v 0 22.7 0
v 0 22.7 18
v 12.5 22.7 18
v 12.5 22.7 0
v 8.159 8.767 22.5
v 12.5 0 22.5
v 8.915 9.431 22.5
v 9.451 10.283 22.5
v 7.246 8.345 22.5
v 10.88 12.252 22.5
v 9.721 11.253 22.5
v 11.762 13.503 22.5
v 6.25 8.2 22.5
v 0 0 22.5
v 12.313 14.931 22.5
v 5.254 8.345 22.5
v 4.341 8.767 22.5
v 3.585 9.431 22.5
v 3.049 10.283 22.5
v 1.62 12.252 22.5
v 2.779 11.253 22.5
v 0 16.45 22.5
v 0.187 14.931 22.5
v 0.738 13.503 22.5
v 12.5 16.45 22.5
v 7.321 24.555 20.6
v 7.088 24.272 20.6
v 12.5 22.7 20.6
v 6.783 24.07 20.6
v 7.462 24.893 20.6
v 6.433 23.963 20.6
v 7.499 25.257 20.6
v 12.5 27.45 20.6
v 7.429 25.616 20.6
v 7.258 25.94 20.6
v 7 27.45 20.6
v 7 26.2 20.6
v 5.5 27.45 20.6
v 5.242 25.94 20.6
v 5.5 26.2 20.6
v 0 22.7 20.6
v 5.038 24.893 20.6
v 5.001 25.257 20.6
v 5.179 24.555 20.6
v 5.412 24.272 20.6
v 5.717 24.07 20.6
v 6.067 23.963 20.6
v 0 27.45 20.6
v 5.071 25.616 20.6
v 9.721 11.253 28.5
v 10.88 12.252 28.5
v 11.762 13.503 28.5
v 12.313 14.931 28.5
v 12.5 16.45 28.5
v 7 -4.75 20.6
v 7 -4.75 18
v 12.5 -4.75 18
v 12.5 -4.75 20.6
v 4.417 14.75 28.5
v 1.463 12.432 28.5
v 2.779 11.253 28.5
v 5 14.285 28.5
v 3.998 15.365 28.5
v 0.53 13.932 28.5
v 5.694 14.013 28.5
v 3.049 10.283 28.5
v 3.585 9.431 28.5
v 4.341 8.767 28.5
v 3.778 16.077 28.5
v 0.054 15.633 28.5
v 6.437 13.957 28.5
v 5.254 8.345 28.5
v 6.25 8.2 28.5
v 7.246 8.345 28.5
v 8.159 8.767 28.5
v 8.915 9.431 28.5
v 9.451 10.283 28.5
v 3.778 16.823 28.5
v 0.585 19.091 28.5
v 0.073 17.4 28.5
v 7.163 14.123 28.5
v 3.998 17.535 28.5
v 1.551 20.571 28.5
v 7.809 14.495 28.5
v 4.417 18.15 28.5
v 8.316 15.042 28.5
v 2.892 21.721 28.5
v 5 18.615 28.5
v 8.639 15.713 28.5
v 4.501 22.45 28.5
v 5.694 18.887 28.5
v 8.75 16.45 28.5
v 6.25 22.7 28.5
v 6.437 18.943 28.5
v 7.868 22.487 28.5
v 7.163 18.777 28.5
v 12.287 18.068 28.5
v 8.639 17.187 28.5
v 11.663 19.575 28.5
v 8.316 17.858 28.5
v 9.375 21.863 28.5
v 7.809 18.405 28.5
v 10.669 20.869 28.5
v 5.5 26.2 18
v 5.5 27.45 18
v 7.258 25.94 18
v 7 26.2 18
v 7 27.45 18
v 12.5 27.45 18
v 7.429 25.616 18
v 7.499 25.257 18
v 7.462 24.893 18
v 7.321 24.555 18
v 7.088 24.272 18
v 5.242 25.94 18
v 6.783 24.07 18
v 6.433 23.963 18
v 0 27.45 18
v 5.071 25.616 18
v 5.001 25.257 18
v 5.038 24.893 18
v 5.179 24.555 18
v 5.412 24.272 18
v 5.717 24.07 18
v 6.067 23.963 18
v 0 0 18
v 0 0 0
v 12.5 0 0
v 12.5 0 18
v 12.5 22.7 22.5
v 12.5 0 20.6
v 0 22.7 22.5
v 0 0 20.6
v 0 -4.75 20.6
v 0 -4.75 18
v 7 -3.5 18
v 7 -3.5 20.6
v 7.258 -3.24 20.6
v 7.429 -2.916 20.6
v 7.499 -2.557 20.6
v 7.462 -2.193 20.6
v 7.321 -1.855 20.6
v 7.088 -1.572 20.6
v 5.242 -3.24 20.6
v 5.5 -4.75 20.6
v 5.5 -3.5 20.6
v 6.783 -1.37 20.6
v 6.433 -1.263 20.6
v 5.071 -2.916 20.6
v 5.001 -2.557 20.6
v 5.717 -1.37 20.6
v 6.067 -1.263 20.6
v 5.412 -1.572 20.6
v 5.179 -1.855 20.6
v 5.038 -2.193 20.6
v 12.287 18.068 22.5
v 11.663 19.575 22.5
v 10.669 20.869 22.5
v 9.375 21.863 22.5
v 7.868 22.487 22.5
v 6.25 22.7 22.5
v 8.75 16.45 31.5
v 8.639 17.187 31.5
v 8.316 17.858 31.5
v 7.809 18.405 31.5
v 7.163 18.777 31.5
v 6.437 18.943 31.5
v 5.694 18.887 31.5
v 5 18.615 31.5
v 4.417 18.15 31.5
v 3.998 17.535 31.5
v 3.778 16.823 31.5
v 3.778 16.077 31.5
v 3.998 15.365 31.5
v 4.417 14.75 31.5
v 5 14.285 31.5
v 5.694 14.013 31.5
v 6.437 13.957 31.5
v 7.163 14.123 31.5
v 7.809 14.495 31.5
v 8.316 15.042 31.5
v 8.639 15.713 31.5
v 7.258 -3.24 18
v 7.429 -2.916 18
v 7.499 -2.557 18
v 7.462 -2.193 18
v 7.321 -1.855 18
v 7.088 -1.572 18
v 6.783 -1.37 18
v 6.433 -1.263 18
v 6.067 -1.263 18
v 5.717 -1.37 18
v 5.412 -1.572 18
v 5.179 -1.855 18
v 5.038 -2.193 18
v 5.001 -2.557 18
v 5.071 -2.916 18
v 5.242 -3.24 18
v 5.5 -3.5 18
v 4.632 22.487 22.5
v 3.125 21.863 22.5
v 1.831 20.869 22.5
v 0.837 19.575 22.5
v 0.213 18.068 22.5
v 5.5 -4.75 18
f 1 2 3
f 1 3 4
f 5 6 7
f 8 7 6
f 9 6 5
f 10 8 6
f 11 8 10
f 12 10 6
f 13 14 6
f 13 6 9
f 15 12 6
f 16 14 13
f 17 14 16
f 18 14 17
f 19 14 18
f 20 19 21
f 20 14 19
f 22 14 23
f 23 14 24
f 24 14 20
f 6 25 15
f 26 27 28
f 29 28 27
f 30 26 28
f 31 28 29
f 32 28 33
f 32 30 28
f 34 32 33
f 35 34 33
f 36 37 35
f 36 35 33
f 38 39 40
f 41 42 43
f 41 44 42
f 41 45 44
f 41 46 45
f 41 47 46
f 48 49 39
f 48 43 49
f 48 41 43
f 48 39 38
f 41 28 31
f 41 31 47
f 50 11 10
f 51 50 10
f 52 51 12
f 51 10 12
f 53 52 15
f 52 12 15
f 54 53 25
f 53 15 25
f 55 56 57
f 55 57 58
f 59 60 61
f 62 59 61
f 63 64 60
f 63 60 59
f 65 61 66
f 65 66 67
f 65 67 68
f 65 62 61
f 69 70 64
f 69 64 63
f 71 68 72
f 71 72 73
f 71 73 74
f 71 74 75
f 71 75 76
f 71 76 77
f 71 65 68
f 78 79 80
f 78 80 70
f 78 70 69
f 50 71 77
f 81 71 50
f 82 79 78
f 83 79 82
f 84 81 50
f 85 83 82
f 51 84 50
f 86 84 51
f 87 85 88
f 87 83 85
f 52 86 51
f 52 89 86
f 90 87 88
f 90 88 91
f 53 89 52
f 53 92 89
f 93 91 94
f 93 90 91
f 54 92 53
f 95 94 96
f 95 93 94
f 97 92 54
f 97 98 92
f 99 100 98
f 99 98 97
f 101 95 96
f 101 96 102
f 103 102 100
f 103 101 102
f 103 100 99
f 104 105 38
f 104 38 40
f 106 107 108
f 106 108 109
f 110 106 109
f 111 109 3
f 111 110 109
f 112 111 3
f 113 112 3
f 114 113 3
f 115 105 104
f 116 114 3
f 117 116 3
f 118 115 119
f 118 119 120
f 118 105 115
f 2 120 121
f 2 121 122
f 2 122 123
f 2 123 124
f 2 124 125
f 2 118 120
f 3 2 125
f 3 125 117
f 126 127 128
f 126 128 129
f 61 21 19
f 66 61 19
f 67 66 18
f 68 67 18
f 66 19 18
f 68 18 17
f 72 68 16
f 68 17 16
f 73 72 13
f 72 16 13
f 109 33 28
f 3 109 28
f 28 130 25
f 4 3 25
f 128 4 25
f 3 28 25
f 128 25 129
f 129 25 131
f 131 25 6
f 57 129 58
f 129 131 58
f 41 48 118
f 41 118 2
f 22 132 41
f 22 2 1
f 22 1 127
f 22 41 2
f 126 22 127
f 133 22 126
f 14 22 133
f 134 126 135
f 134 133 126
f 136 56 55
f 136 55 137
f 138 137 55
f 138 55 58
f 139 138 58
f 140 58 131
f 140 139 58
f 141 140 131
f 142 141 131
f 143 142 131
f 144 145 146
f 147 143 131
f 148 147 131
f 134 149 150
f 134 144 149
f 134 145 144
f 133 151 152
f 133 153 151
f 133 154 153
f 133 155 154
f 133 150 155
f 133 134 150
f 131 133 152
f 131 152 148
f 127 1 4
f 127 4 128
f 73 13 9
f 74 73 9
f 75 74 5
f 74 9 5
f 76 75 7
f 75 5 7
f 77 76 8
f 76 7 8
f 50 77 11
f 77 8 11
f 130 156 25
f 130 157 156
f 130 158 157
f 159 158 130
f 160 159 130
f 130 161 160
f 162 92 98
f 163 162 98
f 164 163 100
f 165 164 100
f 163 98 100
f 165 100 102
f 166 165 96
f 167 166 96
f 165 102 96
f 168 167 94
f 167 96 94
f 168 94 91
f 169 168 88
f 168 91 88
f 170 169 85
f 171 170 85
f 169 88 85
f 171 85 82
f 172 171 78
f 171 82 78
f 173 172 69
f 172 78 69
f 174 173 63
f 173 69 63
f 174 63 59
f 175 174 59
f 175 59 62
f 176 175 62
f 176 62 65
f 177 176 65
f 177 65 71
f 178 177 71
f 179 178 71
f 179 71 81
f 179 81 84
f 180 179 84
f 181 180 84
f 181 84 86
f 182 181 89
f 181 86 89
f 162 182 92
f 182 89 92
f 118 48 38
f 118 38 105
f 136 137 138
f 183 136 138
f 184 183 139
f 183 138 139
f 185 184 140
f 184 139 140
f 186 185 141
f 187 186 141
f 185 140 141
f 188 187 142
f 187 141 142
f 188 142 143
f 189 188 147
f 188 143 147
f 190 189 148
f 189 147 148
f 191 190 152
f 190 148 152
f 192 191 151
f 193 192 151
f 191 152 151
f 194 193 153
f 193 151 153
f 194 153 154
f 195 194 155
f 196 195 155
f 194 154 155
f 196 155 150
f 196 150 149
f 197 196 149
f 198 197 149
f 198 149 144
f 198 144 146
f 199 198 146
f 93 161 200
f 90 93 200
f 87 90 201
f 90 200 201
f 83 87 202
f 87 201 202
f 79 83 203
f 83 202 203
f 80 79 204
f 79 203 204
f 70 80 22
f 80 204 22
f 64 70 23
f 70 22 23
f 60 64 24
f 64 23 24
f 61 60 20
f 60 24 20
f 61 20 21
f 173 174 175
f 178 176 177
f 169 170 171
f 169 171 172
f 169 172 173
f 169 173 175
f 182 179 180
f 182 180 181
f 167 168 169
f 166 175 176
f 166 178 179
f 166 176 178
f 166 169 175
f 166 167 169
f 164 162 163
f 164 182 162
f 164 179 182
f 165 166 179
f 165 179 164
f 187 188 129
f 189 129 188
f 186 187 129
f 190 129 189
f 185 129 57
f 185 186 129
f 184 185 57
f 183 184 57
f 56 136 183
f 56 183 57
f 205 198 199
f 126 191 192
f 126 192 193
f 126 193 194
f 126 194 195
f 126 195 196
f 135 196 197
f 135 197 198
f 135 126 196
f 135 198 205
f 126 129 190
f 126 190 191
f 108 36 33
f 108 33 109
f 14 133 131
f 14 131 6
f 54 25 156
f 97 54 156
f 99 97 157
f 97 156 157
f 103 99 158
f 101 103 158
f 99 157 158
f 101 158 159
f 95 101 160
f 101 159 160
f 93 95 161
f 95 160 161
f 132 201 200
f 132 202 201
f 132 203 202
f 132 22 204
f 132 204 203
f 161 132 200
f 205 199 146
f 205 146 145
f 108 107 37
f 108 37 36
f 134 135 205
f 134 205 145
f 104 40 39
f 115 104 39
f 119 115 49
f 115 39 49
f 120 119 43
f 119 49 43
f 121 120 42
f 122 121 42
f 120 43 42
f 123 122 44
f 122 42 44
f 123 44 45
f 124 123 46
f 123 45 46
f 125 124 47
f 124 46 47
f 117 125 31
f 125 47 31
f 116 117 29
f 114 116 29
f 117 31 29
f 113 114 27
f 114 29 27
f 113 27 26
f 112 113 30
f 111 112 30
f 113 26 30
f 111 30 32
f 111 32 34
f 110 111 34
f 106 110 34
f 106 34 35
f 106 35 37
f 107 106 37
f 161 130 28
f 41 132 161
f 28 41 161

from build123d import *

# Parameters (mm, degrees)
BOSS_EXTRUDE1_DEPTH = 12.5
BOSS_EXTRUDE2_DEPTH = 6
SKETCH4_R           = 2.5
BOSS_EXTRUDE3_DEPTH = 3
SKETCH5_R           = 1.25
CUT_EXTRUDE1_DEPTH  = 2.6


with BuildPart() as part:
    # Sketch2 → Boss-Extrude1 (new body)
    with BuildSketch(Plane.YZ):
        Polygon((0, 0), (0, 18), (-4.75, 18), (-4.75, 20.6), (0, 20.6), (0, 22.5), (22.7, 22.5), (22.7, 20.6), (27.45, 20.6), (27.45, 18), (22.7, 18), (22.7, 0), align=None)
    extrude(amount=BOSS_EXTRUDE1_DEPTH)

    # Sketch3 → Boss-Extrude2 (add)
    with BuildSketch(Plane.XY.offset(22.5)):
        with BuildLine():
            ThreePointArc((2.778708958, 11.252631579), (3.938700525, 9.071712585), (6.25, 8.2))
            Line((6.25, 8.2), (6.25, 10.2))
            ThreePointArc((6.25, 10.2), (4.436309375, 10.468944381), (2.778708958, 11.252631579))
        make_face()
        with BuildLine():
            Line((6.25, 10.2), (6.25, 8.2))
            ThreePointArc((6.25, 8.2), (8.561299475, 9.071712585), (9.721291042, 11.252631579))
            ThreePointArc((9.721291042, 11.252631579), (8.063690625, 10.468944381), (6.25, 10.2))
        make_face()
        with BuildLine():
            ThreePointArc((2.778708958, 11.252631579), (4.436309375, 10.468944381), (6.25, 10.2))
            Line((6.25, 10.2), (6.25, 15.2))
            ThreePointArc((6.25, 15.2), (3.621712585, 14.011299475), (2.778708958, 11.252631579))
        make_face()
        with BuildLine():
            Line((6.25, 15.2), (6.25, 10.2))
            ThreePointArc((6.25, 10.2), (8.063690625, 10.468944381), (9.721291042, 11.252631579))
            ThreePointArc((9.721291042, 11.252631579), (9.742815386, 11.475855678), (9.75, 11.7))
            ThreePointArc((9.75, 11.7), (8.724873734, 14.174873734), (6.25, 15.2))
        make_face()
        with BuildLine():
            ThreePointArc((6.25, 22.7), (0.268944381, 18.263690625), (2.778708958, 11.252631579))
            ThreePointArc((2.778708958, 11.252631579), (3.621712585, 14.011299475), (6.25, 15.2))
            Line((6.25, 15.2), (6.25, 22.7))
        make_face()
        with BuildLine():
            ThreePointArc((9.75, 11.7), (9.742815386, 11.475855678), (9.721291042, 11.252631579))
            ThreePointArc((9.721291042, 11.252631579), (11.761717927, 13.503227953), (12.5, 16.45))
            ThreePointArc((12.5, 16.45), (10.669417382, 20.869417382), (6.25, 22.7))
            Line((6.25, 22.7), (6.25, 15.2))
            ThreePointArc((6.25, 15.2), (8.724873734, 14.174873734), (9.75, 11.7))
        make_face()
    extrude(amount=BOSS_EXTRUDE2_DEPTH)

    # Sketch4 → Boss-Extrude3 (add)
    with BuildSketch(Plane.XY.offset(28.5)):
        with Locations((6.25, 16.45)):
            Circle(SKETCH4_R)
    extrude(amount=BOSS_EXTRUDE3_DEPTH)

    # Sketch5 → Cut-Extrude1 (cut)
    with BuildSketch(Plane.XY.offset(20.6)):
        with BuildLine():
            Line((7, 27.45), (5.5, 27.45))
            Line((5.5, 27.45), (5.5, 26.2))
            ThreePointArc((5.5, 26.2), (6.25, 26.45), (7, 26.2))
            Line((7, 26.2), (7, 27.45))
        make_face()
        with Locations((6.25, 25.2)):
            Circle(SKETCH5_R)
        with BuildLine():
            ThreePointArc((7, -3.5), (6.25, -3.75), (5.5, -3.5))
            Line((5.5, -3.5), (5.5, -4.75))
            Line((5.5, -4.75), (7, -4.75))
            Line((7, -4.75), (7, -3.5))
        make_face()
        with Locations((6.25, -2.5)):
            Circle(SKETCH5_R)
    extrude(amount=-CUT_EXTRUDE1_DEPTH, mode=Mode.SUBTRACT)


solid = part.part
